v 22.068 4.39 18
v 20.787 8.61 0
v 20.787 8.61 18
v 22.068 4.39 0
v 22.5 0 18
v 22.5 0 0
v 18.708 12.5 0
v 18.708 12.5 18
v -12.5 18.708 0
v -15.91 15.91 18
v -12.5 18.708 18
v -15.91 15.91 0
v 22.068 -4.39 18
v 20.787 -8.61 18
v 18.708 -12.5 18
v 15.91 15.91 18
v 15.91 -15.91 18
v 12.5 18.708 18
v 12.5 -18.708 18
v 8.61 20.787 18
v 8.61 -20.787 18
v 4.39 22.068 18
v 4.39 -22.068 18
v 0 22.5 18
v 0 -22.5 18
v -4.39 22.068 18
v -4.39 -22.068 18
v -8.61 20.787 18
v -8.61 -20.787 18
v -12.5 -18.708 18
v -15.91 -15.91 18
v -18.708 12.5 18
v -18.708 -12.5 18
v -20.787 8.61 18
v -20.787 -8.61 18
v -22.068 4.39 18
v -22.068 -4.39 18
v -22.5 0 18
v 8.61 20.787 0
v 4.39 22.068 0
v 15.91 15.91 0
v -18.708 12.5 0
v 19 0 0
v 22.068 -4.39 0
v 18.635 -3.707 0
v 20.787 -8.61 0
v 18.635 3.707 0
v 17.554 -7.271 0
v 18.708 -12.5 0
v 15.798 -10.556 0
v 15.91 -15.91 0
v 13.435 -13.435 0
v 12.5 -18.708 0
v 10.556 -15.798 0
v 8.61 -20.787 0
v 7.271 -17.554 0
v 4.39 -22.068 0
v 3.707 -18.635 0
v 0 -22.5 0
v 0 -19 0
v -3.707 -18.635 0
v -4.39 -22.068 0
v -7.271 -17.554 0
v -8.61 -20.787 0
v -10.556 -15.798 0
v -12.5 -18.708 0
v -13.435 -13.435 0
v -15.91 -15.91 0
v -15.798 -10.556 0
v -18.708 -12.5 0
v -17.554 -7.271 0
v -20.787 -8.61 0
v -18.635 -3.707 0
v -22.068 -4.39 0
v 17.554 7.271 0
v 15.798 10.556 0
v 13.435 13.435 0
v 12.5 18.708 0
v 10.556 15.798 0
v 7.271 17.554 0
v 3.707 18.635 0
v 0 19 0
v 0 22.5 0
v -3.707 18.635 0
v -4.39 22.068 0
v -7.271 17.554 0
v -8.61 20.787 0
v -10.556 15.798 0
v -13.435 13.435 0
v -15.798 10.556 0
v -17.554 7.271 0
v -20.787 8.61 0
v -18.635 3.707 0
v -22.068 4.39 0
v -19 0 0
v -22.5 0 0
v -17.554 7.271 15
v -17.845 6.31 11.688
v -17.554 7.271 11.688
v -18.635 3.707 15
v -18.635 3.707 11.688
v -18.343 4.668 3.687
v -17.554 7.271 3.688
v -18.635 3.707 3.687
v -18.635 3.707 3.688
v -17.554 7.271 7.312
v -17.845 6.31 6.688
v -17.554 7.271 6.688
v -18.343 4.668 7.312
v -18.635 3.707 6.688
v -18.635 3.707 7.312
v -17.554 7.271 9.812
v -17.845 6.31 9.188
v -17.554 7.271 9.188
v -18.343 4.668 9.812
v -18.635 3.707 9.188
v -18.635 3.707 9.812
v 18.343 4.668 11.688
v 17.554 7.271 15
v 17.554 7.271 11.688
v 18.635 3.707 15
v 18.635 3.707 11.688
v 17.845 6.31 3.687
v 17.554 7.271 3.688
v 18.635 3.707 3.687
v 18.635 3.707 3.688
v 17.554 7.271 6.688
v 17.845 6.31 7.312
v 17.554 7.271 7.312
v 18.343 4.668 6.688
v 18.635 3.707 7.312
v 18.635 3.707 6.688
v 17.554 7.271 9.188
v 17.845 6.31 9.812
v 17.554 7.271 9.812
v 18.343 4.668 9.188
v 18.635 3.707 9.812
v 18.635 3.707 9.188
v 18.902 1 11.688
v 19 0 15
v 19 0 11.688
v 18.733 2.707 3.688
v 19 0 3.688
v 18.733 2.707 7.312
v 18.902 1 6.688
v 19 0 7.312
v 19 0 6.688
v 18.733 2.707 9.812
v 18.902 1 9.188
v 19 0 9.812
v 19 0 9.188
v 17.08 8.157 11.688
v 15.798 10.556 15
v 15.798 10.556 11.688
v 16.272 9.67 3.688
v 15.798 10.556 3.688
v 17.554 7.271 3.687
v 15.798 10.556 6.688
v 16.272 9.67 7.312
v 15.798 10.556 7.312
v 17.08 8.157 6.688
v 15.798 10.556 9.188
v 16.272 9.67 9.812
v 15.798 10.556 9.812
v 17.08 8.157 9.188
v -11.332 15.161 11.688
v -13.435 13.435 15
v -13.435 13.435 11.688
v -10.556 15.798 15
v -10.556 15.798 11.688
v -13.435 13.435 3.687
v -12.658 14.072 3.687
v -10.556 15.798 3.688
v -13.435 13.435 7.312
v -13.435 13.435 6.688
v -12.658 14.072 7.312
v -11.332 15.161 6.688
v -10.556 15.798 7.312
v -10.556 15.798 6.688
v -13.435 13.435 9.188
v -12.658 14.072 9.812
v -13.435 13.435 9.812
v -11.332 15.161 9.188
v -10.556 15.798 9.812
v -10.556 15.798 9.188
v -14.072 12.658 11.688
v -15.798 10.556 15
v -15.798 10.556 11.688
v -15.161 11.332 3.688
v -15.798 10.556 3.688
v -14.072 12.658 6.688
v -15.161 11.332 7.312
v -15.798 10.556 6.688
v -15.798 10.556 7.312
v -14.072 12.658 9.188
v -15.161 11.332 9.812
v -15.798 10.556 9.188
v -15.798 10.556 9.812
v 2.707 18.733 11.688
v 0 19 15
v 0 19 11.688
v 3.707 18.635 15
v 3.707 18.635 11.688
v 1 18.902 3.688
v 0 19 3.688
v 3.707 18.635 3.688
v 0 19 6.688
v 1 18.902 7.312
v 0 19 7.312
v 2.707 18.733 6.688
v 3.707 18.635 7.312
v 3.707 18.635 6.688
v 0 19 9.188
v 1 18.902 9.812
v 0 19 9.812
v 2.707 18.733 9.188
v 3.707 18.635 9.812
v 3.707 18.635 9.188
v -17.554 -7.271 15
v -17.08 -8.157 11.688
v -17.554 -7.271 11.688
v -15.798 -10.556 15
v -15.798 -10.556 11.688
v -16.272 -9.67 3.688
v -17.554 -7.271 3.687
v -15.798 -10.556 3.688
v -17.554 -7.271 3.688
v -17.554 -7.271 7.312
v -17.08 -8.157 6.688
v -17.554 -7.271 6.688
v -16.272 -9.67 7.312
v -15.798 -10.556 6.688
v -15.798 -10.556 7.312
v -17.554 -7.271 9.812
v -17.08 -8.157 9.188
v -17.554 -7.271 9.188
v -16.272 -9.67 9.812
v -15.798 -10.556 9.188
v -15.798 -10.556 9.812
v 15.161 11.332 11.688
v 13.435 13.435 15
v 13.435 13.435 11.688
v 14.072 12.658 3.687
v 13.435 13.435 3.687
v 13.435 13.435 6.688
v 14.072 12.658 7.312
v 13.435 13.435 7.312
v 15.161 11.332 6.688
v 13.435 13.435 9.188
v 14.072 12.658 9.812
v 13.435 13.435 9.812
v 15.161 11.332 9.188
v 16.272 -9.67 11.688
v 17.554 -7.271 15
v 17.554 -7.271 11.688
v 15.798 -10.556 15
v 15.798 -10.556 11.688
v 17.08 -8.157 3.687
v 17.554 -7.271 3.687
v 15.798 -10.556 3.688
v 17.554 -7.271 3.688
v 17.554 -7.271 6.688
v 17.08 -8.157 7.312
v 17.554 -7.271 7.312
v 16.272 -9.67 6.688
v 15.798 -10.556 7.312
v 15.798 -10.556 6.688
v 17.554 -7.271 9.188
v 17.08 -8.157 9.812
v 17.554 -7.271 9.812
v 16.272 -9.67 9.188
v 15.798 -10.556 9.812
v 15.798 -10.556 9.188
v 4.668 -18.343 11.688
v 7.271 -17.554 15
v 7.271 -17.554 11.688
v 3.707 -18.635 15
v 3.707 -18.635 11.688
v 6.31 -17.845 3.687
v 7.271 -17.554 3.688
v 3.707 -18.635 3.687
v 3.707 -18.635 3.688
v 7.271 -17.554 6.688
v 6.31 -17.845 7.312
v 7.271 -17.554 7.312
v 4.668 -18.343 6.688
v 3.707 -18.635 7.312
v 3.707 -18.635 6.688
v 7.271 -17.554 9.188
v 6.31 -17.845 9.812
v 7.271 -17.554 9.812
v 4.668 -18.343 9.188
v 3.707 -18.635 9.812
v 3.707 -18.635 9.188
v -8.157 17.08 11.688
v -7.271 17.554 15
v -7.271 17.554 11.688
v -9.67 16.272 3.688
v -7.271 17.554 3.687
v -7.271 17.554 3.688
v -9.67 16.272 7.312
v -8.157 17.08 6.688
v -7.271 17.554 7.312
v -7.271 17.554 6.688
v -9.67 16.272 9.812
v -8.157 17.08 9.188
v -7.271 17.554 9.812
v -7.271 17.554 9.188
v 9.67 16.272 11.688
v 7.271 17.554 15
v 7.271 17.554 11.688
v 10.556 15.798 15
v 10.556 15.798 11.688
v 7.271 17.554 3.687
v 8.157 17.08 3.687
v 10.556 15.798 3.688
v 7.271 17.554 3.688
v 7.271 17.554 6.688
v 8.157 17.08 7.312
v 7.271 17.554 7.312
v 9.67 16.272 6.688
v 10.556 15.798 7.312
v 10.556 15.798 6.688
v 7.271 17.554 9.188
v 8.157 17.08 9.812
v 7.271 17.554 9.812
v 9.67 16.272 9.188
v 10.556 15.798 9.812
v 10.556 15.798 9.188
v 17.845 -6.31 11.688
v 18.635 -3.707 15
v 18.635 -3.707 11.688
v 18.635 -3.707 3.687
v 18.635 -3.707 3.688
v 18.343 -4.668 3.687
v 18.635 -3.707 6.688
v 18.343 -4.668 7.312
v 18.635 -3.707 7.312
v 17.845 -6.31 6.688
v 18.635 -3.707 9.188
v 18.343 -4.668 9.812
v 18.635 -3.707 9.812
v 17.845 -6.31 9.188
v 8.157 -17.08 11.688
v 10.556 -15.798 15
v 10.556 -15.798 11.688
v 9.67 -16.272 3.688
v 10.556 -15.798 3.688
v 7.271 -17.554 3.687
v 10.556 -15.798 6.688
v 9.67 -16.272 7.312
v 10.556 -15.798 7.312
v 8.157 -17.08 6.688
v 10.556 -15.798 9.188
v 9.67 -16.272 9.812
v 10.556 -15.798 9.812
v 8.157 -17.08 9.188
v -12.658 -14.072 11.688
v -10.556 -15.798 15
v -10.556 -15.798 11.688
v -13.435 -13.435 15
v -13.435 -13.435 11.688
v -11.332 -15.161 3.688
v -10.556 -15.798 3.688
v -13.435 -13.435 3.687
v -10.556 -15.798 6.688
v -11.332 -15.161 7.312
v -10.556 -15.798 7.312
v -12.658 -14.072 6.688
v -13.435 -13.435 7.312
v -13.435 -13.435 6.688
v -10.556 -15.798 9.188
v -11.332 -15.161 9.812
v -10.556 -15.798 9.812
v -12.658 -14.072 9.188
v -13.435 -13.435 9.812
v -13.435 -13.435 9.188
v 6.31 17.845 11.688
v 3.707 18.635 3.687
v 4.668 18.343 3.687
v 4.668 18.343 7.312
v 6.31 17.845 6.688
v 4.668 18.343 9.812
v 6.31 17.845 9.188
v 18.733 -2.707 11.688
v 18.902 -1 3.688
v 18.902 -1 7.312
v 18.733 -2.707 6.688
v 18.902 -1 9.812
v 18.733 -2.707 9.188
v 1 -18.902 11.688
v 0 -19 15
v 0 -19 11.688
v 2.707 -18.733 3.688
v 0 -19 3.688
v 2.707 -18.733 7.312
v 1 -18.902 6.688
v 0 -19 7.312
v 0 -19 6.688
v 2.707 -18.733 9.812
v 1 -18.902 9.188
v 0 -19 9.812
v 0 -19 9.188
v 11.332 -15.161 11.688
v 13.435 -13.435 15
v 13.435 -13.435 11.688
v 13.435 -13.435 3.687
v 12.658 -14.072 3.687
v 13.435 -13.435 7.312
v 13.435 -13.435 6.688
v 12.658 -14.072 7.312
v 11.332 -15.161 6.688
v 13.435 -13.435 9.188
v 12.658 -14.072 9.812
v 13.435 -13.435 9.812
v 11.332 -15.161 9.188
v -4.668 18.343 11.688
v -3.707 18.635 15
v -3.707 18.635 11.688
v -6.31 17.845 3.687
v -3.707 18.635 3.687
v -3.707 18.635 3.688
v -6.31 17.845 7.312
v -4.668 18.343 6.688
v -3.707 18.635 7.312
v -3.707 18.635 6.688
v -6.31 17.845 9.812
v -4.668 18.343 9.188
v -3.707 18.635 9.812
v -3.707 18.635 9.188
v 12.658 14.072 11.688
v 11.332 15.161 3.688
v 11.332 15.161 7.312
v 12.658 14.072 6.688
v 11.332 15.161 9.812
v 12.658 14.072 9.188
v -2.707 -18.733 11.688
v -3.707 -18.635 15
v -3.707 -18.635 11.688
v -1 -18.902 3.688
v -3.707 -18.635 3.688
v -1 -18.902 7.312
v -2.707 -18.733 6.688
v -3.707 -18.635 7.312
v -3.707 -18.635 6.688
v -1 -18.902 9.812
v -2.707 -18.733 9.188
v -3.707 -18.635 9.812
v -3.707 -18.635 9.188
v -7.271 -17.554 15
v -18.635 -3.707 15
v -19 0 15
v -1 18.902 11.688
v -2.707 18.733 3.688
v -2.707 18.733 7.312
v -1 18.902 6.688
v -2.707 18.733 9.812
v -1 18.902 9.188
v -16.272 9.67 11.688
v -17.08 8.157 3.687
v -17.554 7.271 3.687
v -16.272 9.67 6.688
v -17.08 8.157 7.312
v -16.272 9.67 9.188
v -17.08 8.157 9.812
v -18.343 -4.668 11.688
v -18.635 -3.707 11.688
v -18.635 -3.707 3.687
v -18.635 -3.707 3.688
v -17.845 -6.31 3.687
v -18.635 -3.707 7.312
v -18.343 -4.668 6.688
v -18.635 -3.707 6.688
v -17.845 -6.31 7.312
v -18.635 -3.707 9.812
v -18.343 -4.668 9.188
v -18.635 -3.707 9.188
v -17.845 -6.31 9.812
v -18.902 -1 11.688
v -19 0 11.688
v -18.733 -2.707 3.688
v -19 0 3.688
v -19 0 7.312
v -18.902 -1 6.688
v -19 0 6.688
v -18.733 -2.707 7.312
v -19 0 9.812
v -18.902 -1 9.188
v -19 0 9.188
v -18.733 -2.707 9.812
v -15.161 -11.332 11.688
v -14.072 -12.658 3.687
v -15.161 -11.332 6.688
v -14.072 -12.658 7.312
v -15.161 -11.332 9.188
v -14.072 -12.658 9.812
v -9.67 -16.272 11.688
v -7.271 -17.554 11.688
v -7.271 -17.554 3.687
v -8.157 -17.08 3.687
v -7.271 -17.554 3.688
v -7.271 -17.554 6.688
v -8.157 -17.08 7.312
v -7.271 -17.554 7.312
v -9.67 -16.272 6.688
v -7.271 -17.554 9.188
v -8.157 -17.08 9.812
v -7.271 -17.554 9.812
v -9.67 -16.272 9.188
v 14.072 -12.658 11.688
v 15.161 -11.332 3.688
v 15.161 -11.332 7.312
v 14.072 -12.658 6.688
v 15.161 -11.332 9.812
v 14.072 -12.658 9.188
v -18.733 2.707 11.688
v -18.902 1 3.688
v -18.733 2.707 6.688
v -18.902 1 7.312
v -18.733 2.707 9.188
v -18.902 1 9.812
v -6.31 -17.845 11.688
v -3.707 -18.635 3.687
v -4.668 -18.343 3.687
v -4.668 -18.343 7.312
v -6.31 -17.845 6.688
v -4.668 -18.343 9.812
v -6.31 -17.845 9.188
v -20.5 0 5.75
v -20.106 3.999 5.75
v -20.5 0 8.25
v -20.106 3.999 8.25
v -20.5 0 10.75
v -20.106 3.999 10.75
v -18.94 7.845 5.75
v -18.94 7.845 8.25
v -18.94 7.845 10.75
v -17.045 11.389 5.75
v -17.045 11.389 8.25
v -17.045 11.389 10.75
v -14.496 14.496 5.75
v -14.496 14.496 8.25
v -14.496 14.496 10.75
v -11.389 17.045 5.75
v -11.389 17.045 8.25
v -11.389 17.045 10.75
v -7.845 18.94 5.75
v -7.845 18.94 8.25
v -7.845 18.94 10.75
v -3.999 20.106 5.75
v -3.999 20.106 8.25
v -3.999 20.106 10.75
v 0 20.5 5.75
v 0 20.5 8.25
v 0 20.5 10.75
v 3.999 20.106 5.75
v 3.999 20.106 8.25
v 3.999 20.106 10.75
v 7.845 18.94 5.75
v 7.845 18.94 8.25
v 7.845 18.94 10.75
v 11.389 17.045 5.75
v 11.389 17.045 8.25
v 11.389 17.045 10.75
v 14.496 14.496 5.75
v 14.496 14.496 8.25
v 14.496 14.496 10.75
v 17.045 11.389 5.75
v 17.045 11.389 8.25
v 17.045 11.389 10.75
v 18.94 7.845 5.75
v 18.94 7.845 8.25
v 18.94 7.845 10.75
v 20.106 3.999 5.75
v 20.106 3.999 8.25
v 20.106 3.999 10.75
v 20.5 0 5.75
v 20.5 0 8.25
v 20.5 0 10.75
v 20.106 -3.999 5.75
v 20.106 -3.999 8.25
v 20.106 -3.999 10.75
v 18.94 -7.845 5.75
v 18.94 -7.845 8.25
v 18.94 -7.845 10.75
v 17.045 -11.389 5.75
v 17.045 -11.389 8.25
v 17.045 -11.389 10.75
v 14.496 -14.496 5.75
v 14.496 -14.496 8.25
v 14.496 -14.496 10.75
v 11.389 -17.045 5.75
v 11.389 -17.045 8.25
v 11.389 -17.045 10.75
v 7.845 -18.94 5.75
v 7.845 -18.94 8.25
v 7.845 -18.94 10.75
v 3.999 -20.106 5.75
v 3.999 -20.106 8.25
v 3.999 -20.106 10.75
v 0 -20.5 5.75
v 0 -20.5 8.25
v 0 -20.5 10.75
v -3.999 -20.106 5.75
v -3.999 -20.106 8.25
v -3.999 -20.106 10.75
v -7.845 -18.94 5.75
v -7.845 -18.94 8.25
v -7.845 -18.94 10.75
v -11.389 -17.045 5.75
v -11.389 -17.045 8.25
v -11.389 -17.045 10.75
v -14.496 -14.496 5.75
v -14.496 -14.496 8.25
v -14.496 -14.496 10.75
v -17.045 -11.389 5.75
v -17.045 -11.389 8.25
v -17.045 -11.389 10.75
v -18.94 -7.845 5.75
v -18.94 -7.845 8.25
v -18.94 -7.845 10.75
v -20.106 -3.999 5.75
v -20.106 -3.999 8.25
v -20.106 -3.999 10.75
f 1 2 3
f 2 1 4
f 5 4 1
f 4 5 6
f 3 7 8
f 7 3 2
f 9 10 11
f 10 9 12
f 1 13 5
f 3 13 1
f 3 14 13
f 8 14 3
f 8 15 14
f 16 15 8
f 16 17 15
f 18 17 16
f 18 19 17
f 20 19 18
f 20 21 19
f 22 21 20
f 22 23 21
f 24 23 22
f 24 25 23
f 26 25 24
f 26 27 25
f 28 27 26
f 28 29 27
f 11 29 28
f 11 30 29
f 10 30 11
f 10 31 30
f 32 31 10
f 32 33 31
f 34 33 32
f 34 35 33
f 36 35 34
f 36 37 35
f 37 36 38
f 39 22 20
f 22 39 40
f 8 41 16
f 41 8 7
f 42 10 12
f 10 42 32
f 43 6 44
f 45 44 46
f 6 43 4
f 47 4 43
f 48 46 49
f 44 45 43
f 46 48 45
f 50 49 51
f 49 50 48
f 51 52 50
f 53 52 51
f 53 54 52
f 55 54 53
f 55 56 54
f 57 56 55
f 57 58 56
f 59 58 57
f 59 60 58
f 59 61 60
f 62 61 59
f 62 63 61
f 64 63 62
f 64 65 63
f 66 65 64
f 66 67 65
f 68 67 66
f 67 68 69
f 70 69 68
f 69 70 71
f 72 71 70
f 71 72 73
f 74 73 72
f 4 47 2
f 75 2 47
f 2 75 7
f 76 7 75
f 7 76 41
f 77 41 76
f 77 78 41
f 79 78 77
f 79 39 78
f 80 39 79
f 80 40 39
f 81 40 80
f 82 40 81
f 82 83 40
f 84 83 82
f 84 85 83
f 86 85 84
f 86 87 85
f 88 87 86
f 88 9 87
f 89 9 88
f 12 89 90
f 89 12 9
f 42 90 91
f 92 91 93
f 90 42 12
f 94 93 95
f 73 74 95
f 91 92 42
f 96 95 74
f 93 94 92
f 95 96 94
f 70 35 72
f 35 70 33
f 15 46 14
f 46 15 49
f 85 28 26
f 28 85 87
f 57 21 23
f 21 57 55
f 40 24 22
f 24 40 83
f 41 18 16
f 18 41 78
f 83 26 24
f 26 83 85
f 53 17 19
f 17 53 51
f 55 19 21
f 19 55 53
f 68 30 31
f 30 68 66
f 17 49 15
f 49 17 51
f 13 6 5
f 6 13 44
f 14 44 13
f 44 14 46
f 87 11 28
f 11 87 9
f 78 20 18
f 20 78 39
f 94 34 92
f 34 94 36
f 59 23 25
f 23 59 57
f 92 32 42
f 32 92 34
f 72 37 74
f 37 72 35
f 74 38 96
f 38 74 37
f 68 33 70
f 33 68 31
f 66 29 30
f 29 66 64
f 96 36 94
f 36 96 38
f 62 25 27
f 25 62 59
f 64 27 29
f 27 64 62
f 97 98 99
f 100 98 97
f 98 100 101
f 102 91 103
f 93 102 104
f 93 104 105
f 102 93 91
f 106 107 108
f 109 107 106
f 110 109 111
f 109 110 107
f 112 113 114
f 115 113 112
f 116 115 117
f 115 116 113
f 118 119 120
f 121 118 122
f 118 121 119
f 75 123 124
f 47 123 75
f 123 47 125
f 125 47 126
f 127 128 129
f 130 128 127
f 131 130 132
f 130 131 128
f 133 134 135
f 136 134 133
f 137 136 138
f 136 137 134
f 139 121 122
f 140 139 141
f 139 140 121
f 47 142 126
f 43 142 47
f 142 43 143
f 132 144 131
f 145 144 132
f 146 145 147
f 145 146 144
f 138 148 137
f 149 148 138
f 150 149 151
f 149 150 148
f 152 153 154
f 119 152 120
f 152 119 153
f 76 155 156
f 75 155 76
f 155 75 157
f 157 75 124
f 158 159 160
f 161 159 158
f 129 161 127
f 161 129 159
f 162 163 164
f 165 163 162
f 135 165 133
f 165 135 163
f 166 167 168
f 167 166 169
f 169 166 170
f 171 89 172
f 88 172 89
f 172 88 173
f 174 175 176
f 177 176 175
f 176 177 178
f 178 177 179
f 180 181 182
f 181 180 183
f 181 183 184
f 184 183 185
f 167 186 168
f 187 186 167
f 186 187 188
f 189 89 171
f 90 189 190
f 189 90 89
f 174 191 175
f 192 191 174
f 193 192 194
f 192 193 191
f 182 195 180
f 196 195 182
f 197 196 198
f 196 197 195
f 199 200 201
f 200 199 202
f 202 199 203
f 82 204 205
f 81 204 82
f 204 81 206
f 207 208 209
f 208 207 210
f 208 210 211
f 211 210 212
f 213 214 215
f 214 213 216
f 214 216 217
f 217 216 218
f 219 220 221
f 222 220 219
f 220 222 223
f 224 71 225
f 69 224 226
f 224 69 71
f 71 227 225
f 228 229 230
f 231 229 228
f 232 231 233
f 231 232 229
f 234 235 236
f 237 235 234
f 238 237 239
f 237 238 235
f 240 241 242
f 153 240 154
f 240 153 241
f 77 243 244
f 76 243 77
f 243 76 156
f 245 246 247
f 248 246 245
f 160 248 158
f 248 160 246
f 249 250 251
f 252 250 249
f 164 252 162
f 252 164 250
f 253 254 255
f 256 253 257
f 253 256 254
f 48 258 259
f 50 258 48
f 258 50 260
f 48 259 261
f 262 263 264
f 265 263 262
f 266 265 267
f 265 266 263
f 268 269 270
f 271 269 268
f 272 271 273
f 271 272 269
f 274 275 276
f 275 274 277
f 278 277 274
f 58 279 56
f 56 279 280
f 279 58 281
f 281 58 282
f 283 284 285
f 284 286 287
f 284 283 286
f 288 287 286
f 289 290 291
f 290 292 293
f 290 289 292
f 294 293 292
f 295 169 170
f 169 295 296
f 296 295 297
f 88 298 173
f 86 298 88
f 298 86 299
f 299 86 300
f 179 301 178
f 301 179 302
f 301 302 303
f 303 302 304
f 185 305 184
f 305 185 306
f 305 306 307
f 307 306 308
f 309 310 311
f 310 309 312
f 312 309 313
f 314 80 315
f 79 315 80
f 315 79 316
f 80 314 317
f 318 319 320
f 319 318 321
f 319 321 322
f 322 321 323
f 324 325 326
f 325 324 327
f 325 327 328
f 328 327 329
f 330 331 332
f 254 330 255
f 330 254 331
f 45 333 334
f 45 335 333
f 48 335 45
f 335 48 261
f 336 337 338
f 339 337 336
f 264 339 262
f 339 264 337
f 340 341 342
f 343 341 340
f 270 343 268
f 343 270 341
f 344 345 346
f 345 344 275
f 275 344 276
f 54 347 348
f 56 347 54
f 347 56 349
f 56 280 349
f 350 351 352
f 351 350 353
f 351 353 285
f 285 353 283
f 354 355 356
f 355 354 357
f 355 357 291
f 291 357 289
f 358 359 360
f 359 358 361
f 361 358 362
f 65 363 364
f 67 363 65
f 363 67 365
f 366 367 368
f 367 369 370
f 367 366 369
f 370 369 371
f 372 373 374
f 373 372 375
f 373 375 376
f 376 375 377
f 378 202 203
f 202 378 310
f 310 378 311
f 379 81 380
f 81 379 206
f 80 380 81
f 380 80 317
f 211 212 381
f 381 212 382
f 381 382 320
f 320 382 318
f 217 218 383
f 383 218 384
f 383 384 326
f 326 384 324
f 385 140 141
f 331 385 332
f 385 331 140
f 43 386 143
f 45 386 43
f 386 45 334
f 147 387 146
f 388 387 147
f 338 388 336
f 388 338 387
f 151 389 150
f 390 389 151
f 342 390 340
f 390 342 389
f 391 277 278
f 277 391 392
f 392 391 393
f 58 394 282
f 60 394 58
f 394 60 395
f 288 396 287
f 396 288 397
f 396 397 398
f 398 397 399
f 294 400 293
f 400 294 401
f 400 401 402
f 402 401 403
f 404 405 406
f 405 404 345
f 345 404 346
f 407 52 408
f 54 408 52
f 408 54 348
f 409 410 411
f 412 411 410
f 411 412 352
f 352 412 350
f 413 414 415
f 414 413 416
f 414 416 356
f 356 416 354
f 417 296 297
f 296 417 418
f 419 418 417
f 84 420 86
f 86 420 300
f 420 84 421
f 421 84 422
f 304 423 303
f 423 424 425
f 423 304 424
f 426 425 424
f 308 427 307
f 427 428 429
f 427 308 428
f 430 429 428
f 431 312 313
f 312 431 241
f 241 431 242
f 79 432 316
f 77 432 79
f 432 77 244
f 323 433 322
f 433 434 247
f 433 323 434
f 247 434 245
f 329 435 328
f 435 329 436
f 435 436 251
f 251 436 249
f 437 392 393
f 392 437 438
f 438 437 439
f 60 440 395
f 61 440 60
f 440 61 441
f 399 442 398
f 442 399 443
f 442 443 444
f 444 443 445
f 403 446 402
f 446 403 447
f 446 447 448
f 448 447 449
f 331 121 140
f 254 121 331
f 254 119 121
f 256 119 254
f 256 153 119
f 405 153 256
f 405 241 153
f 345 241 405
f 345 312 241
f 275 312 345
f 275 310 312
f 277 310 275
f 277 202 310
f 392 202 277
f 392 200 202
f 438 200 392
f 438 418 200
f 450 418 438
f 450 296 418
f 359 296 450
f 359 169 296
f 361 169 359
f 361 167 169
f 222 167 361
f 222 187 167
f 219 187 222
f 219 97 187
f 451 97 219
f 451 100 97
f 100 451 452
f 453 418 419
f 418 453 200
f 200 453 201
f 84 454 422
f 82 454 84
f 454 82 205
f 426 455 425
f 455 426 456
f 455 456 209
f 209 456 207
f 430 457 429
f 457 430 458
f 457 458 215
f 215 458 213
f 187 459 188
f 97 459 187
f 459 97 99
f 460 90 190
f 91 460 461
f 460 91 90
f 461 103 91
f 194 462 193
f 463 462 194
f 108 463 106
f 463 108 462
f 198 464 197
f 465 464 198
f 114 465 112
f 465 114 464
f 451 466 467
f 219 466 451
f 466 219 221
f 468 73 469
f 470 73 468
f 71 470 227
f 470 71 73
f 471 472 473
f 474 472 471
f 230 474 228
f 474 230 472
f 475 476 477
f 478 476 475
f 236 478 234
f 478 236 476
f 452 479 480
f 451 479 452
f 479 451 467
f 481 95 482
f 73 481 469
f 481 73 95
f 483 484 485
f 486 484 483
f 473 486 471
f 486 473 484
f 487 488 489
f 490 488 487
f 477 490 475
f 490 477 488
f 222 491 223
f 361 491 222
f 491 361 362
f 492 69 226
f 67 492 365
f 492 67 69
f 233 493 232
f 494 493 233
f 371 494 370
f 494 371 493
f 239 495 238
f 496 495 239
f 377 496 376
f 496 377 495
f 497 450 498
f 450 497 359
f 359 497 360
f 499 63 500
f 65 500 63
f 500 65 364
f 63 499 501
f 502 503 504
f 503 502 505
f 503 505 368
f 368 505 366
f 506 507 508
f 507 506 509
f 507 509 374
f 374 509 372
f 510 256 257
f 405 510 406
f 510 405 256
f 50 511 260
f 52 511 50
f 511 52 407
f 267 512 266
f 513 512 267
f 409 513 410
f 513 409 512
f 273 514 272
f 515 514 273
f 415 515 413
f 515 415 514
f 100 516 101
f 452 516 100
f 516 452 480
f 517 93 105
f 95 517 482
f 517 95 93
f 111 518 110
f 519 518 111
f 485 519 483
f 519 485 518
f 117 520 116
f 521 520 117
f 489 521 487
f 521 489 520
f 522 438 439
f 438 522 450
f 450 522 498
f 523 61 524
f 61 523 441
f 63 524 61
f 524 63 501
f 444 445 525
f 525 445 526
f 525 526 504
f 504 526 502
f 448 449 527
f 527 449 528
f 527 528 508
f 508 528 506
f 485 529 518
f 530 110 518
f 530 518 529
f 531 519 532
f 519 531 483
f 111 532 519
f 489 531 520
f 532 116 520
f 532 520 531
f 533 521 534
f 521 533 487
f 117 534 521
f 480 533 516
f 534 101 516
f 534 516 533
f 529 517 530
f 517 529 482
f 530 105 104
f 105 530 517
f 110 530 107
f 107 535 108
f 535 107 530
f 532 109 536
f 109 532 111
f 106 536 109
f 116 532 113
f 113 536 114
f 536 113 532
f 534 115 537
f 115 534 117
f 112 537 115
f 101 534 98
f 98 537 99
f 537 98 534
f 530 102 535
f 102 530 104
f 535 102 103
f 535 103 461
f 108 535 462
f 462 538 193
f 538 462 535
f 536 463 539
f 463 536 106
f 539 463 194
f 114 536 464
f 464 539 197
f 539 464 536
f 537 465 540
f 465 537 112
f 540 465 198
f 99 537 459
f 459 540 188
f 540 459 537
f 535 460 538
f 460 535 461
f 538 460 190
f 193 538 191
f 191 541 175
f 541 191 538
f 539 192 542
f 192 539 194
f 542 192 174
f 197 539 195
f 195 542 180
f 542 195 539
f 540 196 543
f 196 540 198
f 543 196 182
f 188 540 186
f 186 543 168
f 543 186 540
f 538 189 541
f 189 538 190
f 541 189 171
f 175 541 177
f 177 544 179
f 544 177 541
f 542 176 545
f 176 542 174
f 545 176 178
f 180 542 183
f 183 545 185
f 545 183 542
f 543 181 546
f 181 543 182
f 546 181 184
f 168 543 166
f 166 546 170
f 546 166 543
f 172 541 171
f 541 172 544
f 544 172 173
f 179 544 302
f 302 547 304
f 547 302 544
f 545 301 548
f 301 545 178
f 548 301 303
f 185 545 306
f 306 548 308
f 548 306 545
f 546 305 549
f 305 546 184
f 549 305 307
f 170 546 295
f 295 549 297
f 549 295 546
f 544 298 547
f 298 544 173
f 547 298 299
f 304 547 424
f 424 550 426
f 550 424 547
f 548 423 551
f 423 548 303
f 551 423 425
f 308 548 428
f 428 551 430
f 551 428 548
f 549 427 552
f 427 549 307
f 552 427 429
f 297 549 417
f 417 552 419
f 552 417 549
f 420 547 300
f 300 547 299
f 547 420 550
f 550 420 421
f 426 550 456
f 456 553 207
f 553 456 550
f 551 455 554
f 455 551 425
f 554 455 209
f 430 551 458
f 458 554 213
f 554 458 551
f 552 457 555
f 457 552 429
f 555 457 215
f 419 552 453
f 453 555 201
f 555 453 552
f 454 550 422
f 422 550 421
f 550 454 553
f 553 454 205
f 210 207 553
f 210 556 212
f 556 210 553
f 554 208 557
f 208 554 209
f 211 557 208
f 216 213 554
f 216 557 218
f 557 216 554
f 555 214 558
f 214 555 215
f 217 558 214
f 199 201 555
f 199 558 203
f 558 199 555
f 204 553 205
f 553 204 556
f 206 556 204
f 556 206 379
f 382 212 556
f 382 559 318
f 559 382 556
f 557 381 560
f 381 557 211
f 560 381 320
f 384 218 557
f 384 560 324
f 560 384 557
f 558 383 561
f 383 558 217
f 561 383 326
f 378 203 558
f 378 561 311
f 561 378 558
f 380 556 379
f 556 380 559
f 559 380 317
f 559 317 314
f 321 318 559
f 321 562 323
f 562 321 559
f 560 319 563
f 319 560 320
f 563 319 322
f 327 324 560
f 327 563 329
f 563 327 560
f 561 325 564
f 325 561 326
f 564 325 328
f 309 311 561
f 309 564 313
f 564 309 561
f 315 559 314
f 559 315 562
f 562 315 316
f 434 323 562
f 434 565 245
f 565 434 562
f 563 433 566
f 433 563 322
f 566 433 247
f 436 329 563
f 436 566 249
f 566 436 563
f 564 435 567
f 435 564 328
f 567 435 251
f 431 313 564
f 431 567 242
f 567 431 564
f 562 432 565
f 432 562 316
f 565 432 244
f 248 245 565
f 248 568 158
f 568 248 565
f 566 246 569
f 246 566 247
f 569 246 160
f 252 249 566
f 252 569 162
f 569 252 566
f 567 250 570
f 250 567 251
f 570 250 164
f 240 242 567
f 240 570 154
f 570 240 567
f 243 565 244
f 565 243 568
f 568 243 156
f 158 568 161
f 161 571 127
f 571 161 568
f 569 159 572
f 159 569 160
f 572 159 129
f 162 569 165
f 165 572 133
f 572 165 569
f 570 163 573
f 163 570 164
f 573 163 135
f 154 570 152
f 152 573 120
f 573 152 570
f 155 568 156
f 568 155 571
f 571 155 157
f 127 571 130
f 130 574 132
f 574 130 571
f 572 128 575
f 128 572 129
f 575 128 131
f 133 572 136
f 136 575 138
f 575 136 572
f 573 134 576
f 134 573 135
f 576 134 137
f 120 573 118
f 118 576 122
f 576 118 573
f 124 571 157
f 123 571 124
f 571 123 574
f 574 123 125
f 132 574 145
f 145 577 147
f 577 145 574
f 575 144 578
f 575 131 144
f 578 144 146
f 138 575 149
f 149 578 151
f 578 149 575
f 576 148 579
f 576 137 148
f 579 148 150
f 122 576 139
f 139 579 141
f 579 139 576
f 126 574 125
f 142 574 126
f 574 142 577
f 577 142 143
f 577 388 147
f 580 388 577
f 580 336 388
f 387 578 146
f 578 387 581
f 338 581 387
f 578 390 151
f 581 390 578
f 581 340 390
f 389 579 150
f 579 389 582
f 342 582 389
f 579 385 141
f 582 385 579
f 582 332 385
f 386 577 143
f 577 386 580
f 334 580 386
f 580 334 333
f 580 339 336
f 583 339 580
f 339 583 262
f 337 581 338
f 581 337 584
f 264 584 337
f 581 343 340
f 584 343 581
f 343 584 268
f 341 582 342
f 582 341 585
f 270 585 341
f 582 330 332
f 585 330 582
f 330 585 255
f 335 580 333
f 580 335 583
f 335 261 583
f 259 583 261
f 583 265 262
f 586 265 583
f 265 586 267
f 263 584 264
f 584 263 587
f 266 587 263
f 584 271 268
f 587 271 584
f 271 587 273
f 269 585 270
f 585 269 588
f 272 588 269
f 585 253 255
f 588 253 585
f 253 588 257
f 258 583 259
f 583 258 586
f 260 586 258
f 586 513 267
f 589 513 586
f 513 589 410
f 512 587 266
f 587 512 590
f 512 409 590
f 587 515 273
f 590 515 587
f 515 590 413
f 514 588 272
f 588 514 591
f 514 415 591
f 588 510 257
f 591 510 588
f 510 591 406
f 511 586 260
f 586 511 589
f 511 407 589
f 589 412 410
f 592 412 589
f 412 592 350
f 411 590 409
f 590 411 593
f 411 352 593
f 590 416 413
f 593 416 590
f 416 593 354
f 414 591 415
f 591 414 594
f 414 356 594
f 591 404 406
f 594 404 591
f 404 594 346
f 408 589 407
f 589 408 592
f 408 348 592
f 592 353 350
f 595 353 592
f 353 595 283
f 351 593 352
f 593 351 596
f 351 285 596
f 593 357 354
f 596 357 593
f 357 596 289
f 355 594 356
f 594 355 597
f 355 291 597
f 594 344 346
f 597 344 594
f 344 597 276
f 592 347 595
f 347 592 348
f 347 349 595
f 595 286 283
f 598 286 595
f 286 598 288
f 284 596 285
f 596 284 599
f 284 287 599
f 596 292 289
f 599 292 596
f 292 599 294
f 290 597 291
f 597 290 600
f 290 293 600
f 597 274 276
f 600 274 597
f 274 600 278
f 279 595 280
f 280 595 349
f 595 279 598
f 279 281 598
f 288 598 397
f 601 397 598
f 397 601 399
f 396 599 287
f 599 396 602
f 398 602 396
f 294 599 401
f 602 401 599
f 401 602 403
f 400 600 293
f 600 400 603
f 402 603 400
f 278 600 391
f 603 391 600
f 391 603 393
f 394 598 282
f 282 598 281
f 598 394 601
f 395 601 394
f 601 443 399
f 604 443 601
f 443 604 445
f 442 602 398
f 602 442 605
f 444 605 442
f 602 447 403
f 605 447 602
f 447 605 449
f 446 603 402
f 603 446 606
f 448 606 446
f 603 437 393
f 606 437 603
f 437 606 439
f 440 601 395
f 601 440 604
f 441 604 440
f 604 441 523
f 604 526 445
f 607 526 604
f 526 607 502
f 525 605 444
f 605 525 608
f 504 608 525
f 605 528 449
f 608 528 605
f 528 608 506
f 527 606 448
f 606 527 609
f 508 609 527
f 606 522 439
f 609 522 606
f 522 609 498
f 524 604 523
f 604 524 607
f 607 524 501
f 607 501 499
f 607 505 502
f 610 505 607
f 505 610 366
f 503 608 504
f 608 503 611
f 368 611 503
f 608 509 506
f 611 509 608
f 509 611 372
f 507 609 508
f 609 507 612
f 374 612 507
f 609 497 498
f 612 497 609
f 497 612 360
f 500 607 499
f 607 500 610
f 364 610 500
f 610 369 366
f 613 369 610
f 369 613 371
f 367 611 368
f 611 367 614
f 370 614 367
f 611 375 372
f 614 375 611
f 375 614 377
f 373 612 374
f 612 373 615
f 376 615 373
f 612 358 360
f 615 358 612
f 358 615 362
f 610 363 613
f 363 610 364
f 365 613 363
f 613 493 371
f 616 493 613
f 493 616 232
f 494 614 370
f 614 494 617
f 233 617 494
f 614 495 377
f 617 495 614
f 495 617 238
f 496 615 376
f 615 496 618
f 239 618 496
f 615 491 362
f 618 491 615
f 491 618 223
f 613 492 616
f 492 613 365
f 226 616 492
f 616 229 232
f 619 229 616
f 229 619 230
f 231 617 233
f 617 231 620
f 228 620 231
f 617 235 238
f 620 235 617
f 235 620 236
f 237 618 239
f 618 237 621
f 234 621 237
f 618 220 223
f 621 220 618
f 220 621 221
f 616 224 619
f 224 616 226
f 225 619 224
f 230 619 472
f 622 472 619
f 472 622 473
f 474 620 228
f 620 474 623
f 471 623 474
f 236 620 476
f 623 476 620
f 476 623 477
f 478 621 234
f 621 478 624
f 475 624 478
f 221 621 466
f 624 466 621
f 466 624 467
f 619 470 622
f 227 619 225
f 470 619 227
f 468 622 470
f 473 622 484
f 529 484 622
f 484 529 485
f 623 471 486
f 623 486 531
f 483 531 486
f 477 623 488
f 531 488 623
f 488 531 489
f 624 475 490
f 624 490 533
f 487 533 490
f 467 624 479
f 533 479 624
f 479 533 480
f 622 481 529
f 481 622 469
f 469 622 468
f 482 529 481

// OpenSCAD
$fn = 32;

// ----------------------------------------------------------------------
// Threaded cap: 45 mm body, 18 mm tall, 38 mm threaded bore
// ----------------------------------------------------------------------

// --- parameters (mm) ---
outer_d = 45;             // cap outside diameter
body_h = 18;              // cap height
top_t = 3;                // closed top thickness
bore_d = 38;              // bore core diameter
pitch = 2.5;              // thread pitch
thread_d = 1.5;           // thread depth
thread_z = 3;             // thread start above the rim
thread_h = 9;             // threaded height

difference() {
  union() {
    cylinder(h = 18, d = outer_d);
  }
  /* threaded bore, closed at the top */
  translate([0, 0, -2.5]) cylinder(h = 17.5, d = bore_d);
  translate([0, 0, 3]) rotate_extrude() polygon([[18, 0], [18, 9], [18.5, 9], [20.5, 7.75], [18.5, 6.5], [20.5, 5.25], [18.5, 4], [20.5, 2.75], [18.5, 0], [18, 0]]);
}
